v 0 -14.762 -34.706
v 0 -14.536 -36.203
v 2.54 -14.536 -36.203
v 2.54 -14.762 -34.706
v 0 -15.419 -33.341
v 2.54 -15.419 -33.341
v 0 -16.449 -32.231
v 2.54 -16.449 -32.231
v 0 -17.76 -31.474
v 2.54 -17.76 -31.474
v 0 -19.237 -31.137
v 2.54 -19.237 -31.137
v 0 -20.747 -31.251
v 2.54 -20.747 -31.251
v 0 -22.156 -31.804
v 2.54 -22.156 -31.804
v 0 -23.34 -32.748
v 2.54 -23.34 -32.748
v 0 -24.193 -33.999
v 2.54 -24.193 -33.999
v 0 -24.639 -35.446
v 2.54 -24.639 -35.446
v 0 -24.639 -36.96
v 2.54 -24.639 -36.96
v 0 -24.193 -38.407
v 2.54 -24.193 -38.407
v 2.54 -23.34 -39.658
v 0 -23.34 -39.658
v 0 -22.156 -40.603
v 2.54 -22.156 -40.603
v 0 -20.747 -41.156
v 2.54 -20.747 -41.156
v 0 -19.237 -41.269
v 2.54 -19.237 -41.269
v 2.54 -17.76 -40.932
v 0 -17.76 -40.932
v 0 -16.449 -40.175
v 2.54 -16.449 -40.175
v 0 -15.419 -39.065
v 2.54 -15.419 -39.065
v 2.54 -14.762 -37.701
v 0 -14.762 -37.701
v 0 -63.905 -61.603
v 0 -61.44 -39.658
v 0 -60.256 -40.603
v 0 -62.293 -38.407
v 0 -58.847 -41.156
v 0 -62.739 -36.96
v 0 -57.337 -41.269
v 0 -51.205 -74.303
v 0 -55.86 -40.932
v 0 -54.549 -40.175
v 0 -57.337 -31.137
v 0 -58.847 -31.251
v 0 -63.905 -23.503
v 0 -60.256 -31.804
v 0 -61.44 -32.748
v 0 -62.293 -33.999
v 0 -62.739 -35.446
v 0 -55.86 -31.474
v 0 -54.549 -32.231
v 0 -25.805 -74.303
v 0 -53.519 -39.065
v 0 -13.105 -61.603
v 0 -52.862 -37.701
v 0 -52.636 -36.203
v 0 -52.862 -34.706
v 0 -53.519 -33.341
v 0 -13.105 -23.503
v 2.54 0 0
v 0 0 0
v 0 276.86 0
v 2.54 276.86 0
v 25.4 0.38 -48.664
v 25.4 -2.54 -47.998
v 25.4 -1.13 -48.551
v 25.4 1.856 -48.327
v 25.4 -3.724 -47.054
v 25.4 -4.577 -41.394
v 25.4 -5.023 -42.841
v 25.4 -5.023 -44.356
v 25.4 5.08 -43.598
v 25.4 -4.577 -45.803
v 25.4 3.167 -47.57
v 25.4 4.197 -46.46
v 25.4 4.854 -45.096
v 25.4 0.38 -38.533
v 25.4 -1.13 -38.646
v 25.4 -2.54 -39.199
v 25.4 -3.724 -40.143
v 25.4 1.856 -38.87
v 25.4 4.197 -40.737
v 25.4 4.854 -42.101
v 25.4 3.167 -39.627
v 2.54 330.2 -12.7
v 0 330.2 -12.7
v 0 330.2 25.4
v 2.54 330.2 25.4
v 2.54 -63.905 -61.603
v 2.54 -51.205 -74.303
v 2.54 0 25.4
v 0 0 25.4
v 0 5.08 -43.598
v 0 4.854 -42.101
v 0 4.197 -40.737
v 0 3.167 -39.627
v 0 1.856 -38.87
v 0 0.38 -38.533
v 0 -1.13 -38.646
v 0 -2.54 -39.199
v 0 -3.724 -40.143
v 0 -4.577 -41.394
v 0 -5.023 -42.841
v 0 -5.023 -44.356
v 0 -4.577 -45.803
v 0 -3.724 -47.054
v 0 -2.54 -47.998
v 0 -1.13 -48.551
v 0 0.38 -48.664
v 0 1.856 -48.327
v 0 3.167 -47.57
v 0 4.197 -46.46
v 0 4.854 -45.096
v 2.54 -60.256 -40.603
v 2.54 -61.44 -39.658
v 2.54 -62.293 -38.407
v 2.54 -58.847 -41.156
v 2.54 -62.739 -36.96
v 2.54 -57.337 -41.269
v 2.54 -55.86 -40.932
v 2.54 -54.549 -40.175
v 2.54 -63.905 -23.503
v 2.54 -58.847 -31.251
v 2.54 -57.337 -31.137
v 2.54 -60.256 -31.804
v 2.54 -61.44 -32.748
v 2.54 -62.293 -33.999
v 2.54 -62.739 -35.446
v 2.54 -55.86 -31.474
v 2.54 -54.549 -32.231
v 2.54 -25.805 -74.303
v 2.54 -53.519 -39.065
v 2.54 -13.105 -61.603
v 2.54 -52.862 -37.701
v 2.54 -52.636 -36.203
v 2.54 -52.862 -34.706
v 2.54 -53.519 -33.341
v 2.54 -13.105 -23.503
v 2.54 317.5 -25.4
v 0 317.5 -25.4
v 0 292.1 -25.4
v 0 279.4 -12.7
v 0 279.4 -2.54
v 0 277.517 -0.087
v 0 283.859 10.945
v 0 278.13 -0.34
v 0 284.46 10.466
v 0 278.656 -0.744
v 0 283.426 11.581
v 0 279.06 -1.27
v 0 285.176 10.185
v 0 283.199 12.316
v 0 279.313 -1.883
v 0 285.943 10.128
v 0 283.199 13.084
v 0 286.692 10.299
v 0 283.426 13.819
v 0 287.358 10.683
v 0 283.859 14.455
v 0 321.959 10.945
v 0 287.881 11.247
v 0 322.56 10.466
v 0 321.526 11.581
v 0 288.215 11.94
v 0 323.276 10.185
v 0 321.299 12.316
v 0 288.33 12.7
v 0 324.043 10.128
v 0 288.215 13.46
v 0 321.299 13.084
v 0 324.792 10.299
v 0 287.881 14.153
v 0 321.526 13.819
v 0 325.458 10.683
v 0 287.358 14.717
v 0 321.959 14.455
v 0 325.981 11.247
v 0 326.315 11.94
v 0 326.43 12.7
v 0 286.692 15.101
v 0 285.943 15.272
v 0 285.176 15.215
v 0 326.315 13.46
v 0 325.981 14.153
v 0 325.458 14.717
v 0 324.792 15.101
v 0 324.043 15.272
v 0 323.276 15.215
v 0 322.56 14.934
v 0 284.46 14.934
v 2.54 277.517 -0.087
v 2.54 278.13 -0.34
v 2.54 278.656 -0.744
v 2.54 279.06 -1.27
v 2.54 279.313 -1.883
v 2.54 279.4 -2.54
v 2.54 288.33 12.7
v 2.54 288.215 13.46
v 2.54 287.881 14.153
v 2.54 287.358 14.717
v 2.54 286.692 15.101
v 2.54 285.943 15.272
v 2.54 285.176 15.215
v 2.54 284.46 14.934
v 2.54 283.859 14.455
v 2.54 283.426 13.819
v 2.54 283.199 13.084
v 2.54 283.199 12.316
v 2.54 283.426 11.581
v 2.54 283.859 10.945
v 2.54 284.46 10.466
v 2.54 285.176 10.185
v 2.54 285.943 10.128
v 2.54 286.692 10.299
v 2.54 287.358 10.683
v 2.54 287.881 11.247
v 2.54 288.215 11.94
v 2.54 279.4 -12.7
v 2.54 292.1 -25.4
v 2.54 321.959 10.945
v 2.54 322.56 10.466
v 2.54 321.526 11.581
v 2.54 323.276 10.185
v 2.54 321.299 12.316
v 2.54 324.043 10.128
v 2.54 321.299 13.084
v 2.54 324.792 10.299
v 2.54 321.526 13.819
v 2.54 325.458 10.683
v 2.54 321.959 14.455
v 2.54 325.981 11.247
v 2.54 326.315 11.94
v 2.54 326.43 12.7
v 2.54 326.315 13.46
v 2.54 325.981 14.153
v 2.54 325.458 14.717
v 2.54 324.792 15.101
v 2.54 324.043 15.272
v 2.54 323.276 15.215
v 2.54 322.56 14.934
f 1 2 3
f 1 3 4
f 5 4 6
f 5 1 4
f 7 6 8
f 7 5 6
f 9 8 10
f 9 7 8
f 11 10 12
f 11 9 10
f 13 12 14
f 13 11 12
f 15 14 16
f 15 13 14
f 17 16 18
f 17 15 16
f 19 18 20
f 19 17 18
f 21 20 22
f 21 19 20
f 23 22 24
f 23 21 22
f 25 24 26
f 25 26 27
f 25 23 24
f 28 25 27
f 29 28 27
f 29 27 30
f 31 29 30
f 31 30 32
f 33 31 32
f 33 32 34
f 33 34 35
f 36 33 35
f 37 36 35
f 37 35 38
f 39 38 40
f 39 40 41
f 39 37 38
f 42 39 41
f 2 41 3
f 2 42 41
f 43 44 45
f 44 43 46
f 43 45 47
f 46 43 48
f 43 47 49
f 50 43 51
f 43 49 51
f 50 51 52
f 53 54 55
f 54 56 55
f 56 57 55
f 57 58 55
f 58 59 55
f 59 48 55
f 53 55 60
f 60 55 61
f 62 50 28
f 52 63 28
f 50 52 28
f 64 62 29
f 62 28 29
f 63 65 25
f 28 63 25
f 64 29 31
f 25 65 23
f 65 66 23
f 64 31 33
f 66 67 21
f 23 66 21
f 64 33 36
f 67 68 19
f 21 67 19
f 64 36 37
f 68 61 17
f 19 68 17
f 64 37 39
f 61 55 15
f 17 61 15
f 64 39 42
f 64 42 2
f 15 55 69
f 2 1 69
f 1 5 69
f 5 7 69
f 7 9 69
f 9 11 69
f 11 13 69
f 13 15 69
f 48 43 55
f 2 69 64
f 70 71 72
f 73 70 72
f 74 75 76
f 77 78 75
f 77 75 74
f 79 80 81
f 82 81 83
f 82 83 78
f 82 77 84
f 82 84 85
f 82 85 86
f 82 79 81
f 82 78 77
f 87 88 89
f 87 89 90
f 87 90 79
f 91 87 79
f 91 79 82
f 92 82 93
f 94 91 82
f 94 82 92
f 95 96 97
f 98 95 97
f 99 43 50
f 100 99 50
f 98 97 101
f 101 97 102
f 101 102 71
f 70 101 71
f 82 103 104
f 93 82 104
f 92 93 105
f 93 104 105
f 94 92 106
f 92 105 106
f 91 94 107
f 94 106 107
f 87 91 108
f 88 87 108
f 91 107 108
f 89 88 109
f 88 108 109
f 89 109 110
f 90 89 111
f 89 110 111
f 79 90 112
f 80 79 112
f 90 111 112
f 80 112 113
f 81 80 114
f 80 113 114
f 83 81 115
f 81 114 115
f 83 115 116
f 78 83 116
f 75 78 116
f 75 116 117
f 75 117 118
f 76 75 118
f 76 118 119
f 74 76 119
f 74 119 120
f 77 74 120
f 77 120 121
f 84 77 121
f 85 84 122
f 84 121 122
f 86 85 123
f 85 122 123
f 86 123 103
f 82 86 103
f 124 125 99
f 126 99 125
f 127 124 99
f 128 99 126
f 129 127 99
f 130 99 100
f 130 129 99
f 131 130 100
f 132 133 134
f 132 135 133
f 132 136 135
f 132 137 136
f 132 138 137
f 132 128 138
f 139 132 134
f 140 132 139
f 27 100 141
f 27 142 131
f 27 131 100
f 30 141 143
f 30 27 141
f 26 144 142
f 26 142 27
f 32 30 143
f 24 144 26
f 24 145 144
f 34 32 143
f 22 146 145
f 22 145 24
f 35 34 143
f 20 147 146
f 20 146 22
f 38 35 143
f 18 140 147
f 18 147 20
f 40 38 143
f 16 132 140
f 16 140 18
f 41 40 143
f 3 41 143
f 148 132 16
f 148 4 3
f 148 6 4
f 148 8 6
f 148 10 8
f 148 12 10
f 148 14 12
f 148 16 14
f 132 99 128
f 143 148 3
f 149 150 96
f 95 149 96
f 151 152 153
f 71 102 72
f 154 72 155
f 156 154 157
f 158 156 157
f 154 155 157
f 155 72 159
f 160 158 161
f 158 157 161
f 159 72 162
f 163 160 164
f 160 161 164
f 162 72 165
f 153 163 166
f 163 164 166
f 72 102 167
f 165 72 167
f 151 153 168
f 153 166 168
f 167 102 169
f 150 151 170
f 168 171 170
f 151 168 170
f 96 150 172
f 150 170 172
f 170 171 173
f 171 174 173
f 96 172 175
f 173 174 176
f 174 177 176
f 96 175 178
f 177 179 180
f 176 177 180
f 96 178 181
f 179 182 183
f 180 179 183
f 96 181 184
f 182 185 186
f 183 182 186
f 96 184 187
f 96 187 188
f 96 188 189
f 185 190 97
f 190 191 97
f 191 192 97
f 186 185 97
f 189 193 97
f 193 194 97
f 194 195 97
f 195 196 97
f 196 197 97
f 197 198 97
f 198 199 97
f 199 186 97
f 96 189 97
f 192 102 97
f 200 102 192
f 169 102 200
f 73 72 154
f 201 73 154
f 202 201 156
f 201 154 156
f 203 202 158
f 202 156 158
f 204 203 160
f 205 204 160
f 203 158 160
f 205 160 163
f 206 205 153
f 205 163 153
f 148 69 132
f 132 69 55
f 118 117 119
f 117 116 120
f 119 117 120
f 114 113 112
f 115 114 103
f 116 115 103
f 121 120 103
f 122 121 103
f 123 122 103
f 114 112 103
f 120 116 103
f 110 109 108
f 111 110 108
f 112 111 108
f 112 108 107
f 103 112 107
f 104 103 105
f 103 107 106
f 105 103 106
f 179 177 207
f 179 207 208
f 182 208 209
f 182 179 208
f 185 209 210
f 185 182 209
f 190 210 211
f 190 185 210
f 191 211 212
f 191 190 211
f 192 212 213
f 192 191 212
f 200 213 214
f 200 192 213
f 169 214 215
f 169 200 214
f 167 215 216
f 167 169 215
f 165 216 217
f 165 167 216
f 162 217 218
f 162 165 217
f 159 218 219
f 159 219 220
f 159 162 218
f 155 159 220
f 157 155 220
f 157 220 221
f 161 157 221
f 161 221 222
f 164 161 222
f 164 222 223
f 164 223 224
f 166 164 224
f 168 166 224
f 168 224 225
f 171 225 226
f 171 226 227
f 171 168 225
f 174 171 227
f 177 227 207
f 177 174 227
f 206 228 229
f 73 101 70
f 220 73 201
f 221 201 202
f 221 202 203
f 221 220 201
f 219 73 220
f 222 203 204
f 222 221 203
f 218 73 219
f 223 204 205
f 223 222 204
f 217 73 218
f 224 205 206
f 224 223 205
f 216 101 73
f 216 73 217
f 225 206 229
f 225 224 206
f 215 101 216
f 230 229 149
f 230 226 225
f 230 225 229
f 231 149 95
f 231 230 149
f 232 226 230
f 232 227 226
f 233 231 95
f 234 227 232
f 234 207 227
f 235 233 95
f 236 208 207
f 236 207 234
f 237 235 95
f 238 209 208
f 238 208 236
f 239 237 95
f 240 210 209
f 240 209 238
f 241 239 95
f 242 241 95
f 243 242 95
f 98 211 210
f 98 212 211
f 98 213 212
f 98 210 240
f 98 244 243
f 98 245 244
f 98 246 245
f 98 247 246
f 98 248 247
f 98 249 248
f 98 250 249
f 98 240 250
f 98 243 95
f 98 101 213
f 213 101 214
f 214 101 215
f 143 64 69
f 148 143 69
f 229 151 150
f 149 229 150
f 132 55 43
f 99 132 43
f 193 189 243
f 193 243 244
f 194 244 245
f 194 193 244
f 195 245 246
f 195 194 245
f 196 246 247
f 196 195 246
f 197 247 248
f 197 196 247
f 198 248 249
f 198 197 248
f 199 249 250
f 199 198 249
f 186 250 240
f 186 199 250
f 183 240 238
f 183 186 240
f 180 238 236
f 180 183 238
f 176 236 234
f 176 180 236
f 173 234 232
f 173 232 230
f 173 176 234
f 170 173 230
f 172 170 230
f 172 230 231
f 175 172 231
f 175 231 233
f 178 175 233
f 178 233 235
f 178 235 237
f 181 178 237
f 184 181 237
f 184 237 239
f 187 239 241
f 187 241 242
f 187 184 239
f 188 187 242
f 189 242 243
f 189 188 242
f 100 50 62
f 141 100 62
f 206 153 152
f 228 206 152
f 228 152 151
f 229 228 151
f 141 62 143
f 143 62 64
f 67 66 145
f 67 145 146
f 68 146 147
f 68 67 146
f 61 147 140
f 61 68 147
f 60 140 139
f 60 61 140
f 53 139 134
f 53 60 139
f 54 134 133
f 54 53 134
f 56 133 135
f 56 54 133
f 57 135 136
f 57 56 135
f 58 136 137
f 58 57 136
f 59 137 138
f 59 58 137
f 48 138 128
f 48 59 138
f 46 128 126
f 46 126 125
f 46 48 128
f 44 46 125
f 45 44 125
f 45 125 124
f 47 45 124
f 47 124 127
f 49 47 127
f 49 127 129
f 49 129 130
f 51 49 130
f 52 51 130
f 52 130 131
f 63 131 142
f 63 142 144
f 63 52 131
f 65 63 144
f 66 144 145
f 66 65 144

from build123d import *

# Parameters (mm, degrees)
F0_R     = 2.579688
F1_DEPTH = 2.54
F0_R_2   = 5.08
F2_DEPTH = 2.54
F3_DEPTH = 25.4


with BuildPart() as f1:
    # F0 (on Right) → F1 (new body)
    with BuildSketch(Plane.YZ):
        with BuildLine():
            Line((0, 25.4), (0, 0))
            Line((0, 0), (276.86, 0))
            ThreePointArc((276.86, 0), (278.656051, -0.743949), (279.4, -2.54))
            Line((279.4, -2.54), (279.4, -12.7))
            Line((279.4, -12.7), (292.1, -25.4))
            Line((292.1, -25.4), (317.5, -25.4))
            Line((317.5, -25.4), (330.2, -12.7))
            Line((330.2, -12.7), (330.2, 25.4))
            Line((330.2, 25.4), (0, 25.4))
        make_face()
        with Locations((285.75, 12.7)):
            Circle(F0_R, mode=Mode.SUBTRACT)
        with Locations((323.85, 12.7)):
            Circle(F0_R, mode=Mode.SUBTRACT)
    extrude(amount=F1_DEPTH)


with BuildPart() as f2:
    # F0 (on Right) → F2 (new body)
    with BuildSketch(Plane.YZ):
        Polygon((-13.104939, -23.503161), (-63.904939, -23.503161), (-63.904939, -61.603161), (-51.204939, -74.303161), (-25.804939, -74.303161), (-13.104939, -61.603161), align=None)
        with Locations((-57.716157, -36.203161)):
            Circle(F0_R_2, mode=Mode.SUBTRACT)
        with Locations((-19.616157, -36.203161)):
            Circle(F0_R_2, mode=Mode.SUBTRACT)
    extrude(amount=F2_DEPTH)


with BuildPart() as f3:
    # F0 (on Right) → F3 (new body)
    with BuildSketch(Plane.YZ):
        with Locations((0, -43.598418)):
            Circle(F0_R_2)
    extrude(amount=F3_DEPTH)


solid = Compound([f1.part, f2.part, f3.part])
